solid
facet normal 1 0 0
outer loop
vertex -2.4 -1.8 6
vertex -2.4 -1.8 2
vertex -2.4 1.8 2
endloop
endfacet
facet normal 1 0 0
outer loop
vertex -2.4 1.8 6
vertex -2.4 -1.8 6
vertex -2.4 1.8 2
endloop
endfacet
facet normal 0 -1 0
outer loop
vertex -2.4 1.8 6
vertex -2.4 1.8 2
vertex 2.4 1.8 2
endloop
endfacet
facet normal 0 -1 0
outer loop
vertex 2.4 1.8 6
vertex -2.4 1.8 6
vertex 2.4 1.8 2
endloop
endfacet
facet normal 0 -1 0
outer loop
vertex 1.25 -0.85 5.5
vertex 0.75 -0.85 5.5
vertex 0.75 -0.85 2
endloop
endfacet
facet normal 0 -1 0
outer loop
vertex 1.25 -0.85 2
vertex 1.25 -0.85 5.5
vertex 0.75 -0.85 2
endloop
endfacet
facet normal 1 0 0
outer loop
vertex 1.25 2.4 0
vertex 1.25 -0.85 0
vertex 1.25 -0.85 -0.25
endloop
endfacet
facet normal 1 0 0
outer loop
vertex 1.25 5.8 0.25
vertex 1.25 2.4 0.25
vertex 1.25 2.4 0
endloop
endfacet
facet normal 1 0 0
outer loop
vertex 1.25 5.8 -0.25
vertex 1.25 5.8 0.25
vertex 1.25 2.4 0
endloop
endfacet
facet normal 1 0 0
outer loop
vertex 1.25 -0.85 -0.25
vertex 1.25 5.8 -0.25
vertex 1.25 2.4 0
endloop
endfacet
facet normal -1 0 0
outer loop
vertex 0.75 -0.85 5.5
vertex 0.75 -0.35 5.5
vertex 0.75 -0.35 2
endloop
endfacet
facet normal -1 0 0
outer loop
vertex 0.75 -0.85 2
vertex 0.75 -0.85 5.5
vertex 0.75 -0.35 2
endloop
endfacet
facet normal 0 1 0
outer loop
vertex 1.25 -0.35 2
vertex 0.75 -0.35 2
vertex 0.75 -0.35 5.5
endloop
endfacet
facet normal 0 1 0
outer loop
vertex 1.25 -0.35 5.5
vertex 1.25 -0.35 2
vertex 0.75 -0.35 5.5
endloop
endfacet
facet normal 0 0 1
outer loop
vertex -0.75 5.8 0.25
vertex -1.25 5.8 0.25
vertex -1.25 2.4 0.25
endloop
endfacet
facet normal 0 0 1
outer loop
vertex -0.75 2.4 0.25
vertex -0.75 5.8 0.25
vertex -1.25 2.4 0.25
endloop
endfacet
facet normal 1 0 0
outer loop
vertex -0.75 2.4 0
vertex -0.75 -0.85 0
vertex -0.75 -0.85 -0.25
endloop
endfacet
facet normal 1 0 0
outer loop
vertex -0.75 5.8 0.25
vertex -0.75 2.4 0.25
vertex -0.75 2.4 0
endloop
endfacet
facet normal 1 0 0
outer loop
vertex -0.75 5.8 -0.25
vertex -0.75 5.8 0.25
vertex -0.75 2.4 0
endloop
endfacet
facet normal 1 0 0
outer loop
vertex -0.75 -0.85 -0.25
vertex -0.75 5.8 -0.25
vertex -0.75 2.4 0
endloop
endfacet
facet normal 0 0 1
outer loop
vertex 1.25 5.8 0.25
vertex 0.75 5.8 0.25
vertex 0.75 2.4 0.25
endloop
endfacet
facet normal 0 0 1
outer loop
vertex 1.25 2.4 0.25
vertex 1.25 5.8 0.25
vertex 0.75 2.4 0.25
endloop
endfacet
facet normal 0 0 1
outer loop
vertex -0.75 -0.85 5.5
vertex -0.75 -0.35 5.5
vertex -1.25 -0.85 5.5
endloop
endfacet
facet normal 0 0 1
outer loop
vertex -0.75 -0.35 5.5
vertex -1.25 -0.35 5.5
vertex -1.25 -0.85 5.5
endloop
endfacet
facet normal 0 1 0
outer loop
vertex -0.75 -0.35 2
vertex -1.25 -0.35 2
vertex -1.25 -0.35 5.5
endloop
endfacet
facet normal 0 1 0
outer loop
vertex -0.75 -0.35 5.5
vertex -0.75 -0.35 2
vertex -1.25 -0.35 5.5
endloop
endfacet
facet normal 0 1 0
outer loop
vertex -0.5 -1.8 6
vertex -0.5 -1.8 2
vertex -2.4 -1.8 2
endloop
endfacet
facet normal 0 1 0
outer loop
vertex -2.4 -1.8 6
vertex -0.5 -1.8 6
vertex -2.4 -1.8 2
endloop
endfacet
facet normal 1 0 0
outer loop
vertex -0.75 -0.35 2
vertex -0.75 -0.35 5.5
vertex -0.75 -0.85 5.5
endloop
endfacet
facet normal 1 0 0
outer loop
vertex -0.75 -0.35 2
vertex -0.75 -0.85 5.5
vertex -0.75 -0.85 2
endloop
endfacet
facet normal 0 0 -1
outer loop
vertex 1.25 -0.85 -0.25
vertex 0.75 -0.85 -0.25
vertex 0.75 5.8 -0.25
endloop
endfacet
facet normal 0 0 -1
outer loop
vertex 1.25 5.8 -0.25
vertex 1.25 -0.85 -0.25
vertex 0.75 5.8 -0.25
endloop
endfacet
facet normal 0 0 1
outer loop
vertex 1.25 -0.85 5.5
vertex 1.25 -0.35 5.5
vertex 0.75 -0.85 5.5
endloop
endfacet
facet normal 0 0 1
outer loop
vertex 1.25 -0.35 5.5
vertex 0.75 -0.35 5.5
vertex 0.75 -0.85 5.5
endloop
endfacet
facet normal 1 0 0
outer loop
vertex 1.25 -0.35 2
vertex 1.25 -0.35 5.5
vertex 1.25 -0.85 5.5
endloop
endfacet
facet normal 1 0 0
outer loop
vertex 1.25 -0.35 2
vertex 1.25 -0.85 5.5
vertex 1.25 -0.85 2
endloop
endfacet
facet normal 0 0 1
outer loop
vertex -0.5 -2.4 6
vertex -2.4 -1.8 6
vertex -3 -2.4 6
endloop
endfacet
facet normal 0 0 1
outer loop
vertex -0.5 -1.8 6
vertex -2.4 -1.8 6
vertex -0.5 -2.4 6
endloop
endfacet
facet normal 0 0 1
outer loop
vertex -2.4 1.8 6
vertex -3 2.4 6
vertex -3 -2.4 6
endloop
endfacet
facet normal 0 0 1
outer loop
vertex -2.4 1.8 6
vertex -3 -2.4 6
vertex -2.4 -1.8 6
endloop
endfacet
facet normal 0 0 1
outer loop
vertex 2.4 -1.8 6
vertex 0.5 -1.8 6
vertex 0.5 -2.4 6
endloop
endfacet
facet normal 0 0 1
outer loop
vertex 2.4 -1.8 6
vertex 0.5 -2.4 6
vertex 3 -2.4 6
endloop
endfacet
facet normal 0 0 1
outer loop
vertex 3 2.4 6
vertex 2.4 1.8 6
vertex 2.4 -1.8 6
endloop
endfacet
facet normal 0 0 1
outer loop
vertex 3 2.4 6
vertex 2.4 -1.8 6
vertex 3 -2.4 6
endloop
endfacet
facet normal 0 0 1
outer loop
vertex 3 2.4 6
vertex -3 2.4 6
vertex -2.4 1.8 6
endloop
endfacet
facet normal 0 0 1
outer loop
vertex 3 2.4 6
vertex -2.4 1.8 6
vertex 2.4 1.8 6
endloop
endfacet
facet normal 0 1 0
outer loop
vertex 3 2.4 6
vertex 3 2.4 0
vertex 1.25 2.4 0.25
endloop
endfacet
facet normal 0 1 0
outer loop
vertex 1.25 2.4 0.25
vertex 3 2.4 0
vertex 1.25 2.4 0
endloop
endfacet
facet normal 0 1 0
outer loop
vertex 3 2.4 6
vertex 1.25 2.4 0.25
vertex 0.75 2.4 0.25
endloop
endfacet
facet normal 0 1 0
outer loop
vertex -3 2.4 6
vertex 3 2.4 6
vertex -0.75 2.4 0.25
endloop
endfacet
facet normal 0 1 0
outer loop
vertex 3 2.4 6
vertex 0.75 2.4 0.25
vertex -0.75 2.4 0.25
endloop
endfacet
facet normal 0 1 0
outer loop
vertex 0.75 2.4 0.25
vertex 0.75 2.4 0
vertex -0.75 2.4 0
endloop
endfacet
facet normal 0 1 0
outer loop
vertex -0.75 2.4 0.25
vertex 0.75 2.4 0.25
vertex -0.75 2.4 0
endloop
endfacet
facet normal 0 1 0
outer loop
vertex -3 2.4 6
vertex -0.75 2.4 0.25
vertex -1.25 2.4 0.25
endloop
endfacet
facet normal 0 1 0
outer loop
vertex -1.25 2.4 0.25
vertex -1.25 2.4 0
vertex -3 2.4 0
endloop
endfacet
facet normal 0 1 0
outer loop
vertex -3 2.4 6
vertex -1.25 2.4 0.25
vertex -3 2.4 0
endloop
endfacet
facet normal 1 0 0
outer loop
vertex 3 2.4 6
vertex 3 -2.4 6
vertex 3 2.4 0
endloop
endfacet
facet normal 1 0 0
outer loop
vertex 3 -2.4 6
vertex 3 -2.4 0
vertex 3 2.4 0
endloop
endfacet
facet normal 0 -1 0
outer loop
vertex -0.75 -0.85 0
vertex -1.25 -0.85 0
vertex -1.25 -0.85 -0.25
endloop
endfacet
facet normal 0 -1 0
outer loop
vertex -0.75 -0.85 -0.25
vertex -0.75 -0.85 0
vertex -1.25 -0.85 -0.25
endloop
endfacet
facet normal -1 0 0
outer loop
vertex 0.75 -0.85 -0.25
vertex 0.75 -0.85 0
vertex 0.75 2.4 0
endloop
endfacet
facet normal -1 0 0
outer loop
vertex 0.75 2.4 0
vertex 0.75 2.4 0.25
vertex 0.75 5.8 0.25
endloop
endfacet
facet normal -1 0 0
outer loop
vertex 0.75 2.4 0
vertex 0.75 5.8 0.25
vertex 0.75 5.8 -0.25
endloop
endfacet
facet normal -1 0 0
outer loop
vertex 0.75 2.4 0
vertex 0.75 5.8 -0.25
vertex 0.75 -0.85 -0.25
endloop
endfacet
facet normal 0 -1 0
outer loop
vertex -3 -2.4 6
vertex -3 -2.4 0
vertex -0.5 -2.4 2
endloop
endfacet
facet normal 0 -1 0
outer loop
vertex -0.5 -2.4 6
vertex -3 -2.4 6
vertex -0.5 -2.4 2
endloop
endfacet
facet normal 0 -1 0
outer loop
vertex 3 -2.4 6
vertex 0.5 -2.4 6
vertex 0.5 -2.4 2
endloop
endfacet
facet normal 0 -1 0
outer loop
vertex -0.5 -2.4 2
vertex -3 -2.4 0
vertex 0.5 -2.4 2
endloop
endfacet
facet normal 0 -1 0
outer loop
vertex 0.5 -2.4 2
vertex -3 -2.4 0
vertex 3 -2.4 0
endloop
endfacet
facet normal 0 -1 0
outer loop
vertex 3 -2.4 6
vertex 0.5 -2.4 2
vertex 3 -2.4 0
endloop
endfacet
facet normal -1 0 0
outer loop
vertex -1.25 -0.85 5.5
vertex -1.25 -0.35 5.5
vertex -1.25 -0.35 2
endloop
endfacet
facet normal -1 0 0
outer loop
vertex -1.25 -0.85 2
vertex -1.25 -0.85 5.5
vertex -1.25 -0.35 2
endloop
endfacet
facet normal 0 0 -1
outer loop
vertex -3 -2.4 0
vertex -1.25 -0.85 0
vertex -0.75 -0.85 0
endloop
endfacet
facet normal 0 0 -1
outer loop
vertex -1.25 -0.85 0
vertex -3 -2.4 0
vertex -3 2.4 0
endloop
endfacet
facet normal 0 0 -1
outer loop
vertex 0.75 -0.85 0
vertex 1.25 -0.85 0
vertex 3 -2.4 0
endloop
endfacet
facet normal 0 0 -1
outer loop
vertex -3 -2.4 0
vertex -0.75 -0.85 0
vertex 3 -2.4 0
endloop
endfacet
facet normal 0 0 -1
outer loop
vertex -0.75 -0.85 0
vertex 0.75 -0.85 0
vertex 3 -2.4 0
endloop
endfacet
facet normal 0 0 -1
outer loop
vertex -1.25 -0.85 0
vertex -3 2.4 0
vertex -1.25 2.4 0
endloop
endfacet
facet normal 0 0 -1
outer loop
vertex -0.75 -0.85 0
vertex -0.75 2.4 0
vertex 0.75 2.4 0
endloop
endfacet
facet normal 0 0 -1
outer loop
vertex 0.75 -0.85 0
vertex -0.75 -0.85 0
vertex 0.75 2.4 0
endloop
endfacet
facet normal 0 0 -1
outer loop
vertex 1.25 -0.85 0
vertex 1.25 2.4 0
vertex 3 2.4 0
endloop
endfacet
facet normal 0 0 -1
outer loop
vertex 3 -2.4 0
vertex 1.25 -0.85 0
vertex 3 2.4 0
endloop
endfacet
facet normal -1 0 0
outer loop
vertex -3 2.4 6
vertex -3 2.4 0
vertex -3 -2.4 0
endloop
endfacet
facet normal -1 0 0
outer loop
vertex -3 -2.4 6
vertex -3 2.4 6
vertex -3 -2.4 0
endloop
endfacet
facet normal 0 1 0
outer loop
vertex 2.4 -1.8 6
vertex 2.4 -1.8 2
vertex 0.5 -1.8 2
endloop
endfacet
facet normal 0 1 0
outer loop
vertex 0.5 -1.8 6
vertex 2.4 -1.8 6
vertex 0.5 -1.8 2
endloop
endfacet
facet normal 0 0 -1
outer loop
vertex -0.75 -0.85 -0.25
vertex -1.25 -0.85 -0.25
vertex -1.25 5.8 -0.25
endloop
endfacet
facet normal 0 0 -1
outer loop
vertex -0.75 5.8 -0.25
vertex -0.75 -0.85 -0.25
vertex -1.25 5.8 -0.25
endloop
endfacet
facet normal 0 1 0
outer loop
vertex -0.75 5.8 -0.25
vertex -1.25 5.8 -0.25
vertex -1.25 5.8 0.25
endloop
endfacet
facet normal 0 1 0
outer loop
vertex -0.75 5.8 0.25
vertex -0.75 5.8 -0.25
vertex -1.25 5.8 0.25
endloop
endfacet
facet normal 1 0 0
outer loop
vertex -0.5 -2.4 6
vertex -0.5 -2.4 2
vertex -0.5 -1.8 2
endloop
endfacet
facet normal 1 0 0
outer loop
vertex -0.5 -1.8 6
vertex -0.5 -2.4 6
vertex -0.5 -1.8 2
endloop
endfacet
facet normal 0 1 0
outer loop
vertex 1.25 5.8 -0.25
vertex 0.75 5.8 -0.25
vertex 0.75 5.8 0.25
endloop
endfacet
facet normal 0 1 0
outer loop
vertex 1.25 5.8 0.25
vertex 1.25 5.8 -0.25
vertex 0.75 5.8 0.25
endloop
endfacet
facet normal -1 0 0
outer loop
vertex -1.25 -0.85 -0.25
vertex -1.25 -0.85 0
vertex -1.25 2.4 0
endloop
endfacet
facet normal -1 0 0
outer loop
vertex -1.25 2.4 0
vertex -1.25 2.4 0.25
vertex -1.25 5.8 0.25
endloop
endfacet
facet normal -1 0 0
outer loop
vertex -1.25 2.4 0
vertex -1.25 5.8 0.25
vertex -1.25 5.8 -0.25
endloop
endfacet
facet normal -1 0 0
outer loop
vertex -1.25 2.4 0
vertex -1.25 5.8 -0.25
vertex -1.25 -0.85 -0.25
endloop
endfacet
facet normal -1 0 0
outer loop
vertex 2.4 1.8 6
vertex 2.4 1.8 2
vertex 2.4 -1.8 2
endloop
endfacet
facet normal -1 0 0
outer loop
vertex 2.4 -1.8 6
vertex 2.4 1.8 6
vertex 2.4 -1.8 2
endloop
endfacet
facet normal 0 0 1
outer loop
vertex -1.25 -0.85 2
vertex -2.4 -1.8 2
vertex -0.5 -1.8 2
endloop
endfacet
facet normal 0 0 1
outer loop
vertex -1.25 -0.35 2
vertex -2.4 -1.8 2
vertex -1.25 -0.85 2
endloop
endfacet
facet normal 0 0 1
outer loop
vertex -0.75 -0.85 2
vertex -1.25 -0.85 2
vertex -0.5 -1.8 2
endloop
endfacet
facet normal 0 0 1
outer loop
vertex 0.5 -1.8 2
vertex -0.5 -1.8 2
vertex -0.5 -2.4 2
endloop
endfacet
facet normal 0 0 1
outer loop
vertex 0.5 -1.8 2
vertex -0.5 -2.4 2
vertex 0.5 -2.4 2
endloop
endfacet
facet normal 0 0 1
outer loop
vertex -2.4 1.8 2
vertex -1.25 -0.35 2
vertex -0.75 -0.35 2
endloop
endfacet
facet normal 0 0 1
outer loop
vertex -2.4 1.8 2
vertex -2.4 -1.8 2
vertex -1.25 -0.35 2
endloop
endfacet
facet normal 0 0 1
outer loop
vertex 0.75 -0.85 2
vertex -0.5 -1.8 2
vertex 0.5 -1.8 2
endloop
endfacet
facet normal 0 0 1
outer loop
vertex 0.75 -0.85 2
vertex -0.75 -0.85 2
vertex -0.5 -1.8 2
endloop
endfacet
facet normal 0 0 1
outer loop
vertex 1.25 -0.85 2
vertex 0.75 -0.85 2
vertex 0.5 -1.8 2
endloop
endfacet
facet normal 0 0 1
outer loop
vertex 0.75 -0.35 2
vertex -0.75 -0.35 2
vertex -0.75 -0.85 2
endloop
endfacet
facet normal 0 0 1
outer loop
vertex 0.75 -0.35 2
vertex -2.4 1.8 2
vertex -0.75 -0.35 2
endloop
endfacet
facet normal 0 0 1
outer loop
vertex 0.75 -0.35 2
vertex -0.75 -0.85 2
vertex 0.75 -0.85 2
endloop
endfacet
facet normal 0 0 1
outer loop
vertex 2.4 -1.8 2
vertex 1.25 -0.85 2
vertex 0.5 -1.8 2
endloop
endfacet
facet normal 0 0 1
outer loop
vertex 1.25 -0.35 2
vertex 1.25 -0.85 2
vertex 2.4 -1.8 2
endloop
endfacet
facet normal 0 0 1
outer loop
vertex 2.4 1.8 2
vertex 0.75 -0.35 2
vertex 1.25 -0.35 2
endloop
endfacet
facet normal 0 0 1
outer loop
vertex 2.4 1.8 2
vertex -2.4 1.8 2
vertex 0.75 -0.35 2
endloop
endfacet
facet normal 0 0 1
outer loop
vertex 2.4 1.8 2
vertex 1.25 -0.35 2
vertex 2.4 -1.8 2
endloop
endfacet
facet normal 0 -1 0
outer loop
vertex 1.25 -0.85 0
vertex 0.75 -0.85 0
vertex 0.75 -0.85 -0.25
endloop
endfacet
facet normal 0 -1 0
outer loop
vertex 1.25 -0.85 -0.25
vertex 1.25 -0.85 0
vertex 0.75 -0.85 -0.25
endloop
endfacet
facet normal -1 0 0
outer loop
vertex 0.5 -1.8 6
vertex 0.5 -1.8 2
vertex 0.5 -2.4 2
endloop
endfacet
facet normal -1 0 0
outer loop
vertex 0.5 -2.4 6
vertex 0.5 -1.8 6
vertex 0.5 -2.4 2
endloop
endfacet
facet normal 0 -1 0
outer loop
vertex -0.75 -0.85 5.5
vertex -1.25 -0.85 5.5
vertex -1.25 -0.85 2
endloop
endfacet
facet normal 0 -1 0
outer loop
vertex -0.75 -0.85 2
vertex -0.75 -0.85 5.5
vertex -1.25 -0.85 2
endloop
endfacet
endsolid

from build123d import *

# Parameters (mm, degrees)
SKETCH1_W           = 6
SKETCH1_H           = 4.8
BOSS_EXTRUDE1_DEPTH = 2
BOSS_EXTRUDE2_DEPTH = 4
PIN_DEPTH           = 0.25
LPATTERN1_COUNT     = 2
LPATTERN1_PITCH     = 2


with BuildPart() as part:
    # Sketch1 → Boss-Extrude1 (new body)
    with BuildSketch(Plane.XY):
        Rectangle(SKETCH1_W, SKETCH1_H)
    extrude(amount=BOSS_EXTRUDE1_DEPTH)

    # Sketch2 → Boss-Extrude2 (add)
    with BuildSketch(Plane.XY.offset(2)):
        Polygon((-0.5, -2.4), (-0.5, -1.8), (-2.4, -1.8), (-2.4, 1.8), (2.4, 1.8), (2.4, -1.8), (0.5, -1.8), (0.5, -2.4), (3, -2.4), (3, 2.4), (-3, 2.4), (-3, -2.4), align=None)
    extrude(amount=BOSS_EXTRUDE2_DEPTH)

    # Sketch3 → Pin (add, symmetric)
    with BuildSketch(Plane.ZY.offset(1)):
        Polygon((0.25, 5.8), (0.25, -0.35), (5.5, -0.35), (5.5, -0.85), (-0.25, -0.85), (-0.25, 5.8), align=None)
    pin = extrude(amount=PIN_DEPTH, both=True)

    # LPattern1: Pin ×2
    with Locations(*[(i * LPATTERN1_PITCH, 0, 0) for i in range(1, LPATTERN1_COUNT)]):
        add(pin)


solid = part.part
